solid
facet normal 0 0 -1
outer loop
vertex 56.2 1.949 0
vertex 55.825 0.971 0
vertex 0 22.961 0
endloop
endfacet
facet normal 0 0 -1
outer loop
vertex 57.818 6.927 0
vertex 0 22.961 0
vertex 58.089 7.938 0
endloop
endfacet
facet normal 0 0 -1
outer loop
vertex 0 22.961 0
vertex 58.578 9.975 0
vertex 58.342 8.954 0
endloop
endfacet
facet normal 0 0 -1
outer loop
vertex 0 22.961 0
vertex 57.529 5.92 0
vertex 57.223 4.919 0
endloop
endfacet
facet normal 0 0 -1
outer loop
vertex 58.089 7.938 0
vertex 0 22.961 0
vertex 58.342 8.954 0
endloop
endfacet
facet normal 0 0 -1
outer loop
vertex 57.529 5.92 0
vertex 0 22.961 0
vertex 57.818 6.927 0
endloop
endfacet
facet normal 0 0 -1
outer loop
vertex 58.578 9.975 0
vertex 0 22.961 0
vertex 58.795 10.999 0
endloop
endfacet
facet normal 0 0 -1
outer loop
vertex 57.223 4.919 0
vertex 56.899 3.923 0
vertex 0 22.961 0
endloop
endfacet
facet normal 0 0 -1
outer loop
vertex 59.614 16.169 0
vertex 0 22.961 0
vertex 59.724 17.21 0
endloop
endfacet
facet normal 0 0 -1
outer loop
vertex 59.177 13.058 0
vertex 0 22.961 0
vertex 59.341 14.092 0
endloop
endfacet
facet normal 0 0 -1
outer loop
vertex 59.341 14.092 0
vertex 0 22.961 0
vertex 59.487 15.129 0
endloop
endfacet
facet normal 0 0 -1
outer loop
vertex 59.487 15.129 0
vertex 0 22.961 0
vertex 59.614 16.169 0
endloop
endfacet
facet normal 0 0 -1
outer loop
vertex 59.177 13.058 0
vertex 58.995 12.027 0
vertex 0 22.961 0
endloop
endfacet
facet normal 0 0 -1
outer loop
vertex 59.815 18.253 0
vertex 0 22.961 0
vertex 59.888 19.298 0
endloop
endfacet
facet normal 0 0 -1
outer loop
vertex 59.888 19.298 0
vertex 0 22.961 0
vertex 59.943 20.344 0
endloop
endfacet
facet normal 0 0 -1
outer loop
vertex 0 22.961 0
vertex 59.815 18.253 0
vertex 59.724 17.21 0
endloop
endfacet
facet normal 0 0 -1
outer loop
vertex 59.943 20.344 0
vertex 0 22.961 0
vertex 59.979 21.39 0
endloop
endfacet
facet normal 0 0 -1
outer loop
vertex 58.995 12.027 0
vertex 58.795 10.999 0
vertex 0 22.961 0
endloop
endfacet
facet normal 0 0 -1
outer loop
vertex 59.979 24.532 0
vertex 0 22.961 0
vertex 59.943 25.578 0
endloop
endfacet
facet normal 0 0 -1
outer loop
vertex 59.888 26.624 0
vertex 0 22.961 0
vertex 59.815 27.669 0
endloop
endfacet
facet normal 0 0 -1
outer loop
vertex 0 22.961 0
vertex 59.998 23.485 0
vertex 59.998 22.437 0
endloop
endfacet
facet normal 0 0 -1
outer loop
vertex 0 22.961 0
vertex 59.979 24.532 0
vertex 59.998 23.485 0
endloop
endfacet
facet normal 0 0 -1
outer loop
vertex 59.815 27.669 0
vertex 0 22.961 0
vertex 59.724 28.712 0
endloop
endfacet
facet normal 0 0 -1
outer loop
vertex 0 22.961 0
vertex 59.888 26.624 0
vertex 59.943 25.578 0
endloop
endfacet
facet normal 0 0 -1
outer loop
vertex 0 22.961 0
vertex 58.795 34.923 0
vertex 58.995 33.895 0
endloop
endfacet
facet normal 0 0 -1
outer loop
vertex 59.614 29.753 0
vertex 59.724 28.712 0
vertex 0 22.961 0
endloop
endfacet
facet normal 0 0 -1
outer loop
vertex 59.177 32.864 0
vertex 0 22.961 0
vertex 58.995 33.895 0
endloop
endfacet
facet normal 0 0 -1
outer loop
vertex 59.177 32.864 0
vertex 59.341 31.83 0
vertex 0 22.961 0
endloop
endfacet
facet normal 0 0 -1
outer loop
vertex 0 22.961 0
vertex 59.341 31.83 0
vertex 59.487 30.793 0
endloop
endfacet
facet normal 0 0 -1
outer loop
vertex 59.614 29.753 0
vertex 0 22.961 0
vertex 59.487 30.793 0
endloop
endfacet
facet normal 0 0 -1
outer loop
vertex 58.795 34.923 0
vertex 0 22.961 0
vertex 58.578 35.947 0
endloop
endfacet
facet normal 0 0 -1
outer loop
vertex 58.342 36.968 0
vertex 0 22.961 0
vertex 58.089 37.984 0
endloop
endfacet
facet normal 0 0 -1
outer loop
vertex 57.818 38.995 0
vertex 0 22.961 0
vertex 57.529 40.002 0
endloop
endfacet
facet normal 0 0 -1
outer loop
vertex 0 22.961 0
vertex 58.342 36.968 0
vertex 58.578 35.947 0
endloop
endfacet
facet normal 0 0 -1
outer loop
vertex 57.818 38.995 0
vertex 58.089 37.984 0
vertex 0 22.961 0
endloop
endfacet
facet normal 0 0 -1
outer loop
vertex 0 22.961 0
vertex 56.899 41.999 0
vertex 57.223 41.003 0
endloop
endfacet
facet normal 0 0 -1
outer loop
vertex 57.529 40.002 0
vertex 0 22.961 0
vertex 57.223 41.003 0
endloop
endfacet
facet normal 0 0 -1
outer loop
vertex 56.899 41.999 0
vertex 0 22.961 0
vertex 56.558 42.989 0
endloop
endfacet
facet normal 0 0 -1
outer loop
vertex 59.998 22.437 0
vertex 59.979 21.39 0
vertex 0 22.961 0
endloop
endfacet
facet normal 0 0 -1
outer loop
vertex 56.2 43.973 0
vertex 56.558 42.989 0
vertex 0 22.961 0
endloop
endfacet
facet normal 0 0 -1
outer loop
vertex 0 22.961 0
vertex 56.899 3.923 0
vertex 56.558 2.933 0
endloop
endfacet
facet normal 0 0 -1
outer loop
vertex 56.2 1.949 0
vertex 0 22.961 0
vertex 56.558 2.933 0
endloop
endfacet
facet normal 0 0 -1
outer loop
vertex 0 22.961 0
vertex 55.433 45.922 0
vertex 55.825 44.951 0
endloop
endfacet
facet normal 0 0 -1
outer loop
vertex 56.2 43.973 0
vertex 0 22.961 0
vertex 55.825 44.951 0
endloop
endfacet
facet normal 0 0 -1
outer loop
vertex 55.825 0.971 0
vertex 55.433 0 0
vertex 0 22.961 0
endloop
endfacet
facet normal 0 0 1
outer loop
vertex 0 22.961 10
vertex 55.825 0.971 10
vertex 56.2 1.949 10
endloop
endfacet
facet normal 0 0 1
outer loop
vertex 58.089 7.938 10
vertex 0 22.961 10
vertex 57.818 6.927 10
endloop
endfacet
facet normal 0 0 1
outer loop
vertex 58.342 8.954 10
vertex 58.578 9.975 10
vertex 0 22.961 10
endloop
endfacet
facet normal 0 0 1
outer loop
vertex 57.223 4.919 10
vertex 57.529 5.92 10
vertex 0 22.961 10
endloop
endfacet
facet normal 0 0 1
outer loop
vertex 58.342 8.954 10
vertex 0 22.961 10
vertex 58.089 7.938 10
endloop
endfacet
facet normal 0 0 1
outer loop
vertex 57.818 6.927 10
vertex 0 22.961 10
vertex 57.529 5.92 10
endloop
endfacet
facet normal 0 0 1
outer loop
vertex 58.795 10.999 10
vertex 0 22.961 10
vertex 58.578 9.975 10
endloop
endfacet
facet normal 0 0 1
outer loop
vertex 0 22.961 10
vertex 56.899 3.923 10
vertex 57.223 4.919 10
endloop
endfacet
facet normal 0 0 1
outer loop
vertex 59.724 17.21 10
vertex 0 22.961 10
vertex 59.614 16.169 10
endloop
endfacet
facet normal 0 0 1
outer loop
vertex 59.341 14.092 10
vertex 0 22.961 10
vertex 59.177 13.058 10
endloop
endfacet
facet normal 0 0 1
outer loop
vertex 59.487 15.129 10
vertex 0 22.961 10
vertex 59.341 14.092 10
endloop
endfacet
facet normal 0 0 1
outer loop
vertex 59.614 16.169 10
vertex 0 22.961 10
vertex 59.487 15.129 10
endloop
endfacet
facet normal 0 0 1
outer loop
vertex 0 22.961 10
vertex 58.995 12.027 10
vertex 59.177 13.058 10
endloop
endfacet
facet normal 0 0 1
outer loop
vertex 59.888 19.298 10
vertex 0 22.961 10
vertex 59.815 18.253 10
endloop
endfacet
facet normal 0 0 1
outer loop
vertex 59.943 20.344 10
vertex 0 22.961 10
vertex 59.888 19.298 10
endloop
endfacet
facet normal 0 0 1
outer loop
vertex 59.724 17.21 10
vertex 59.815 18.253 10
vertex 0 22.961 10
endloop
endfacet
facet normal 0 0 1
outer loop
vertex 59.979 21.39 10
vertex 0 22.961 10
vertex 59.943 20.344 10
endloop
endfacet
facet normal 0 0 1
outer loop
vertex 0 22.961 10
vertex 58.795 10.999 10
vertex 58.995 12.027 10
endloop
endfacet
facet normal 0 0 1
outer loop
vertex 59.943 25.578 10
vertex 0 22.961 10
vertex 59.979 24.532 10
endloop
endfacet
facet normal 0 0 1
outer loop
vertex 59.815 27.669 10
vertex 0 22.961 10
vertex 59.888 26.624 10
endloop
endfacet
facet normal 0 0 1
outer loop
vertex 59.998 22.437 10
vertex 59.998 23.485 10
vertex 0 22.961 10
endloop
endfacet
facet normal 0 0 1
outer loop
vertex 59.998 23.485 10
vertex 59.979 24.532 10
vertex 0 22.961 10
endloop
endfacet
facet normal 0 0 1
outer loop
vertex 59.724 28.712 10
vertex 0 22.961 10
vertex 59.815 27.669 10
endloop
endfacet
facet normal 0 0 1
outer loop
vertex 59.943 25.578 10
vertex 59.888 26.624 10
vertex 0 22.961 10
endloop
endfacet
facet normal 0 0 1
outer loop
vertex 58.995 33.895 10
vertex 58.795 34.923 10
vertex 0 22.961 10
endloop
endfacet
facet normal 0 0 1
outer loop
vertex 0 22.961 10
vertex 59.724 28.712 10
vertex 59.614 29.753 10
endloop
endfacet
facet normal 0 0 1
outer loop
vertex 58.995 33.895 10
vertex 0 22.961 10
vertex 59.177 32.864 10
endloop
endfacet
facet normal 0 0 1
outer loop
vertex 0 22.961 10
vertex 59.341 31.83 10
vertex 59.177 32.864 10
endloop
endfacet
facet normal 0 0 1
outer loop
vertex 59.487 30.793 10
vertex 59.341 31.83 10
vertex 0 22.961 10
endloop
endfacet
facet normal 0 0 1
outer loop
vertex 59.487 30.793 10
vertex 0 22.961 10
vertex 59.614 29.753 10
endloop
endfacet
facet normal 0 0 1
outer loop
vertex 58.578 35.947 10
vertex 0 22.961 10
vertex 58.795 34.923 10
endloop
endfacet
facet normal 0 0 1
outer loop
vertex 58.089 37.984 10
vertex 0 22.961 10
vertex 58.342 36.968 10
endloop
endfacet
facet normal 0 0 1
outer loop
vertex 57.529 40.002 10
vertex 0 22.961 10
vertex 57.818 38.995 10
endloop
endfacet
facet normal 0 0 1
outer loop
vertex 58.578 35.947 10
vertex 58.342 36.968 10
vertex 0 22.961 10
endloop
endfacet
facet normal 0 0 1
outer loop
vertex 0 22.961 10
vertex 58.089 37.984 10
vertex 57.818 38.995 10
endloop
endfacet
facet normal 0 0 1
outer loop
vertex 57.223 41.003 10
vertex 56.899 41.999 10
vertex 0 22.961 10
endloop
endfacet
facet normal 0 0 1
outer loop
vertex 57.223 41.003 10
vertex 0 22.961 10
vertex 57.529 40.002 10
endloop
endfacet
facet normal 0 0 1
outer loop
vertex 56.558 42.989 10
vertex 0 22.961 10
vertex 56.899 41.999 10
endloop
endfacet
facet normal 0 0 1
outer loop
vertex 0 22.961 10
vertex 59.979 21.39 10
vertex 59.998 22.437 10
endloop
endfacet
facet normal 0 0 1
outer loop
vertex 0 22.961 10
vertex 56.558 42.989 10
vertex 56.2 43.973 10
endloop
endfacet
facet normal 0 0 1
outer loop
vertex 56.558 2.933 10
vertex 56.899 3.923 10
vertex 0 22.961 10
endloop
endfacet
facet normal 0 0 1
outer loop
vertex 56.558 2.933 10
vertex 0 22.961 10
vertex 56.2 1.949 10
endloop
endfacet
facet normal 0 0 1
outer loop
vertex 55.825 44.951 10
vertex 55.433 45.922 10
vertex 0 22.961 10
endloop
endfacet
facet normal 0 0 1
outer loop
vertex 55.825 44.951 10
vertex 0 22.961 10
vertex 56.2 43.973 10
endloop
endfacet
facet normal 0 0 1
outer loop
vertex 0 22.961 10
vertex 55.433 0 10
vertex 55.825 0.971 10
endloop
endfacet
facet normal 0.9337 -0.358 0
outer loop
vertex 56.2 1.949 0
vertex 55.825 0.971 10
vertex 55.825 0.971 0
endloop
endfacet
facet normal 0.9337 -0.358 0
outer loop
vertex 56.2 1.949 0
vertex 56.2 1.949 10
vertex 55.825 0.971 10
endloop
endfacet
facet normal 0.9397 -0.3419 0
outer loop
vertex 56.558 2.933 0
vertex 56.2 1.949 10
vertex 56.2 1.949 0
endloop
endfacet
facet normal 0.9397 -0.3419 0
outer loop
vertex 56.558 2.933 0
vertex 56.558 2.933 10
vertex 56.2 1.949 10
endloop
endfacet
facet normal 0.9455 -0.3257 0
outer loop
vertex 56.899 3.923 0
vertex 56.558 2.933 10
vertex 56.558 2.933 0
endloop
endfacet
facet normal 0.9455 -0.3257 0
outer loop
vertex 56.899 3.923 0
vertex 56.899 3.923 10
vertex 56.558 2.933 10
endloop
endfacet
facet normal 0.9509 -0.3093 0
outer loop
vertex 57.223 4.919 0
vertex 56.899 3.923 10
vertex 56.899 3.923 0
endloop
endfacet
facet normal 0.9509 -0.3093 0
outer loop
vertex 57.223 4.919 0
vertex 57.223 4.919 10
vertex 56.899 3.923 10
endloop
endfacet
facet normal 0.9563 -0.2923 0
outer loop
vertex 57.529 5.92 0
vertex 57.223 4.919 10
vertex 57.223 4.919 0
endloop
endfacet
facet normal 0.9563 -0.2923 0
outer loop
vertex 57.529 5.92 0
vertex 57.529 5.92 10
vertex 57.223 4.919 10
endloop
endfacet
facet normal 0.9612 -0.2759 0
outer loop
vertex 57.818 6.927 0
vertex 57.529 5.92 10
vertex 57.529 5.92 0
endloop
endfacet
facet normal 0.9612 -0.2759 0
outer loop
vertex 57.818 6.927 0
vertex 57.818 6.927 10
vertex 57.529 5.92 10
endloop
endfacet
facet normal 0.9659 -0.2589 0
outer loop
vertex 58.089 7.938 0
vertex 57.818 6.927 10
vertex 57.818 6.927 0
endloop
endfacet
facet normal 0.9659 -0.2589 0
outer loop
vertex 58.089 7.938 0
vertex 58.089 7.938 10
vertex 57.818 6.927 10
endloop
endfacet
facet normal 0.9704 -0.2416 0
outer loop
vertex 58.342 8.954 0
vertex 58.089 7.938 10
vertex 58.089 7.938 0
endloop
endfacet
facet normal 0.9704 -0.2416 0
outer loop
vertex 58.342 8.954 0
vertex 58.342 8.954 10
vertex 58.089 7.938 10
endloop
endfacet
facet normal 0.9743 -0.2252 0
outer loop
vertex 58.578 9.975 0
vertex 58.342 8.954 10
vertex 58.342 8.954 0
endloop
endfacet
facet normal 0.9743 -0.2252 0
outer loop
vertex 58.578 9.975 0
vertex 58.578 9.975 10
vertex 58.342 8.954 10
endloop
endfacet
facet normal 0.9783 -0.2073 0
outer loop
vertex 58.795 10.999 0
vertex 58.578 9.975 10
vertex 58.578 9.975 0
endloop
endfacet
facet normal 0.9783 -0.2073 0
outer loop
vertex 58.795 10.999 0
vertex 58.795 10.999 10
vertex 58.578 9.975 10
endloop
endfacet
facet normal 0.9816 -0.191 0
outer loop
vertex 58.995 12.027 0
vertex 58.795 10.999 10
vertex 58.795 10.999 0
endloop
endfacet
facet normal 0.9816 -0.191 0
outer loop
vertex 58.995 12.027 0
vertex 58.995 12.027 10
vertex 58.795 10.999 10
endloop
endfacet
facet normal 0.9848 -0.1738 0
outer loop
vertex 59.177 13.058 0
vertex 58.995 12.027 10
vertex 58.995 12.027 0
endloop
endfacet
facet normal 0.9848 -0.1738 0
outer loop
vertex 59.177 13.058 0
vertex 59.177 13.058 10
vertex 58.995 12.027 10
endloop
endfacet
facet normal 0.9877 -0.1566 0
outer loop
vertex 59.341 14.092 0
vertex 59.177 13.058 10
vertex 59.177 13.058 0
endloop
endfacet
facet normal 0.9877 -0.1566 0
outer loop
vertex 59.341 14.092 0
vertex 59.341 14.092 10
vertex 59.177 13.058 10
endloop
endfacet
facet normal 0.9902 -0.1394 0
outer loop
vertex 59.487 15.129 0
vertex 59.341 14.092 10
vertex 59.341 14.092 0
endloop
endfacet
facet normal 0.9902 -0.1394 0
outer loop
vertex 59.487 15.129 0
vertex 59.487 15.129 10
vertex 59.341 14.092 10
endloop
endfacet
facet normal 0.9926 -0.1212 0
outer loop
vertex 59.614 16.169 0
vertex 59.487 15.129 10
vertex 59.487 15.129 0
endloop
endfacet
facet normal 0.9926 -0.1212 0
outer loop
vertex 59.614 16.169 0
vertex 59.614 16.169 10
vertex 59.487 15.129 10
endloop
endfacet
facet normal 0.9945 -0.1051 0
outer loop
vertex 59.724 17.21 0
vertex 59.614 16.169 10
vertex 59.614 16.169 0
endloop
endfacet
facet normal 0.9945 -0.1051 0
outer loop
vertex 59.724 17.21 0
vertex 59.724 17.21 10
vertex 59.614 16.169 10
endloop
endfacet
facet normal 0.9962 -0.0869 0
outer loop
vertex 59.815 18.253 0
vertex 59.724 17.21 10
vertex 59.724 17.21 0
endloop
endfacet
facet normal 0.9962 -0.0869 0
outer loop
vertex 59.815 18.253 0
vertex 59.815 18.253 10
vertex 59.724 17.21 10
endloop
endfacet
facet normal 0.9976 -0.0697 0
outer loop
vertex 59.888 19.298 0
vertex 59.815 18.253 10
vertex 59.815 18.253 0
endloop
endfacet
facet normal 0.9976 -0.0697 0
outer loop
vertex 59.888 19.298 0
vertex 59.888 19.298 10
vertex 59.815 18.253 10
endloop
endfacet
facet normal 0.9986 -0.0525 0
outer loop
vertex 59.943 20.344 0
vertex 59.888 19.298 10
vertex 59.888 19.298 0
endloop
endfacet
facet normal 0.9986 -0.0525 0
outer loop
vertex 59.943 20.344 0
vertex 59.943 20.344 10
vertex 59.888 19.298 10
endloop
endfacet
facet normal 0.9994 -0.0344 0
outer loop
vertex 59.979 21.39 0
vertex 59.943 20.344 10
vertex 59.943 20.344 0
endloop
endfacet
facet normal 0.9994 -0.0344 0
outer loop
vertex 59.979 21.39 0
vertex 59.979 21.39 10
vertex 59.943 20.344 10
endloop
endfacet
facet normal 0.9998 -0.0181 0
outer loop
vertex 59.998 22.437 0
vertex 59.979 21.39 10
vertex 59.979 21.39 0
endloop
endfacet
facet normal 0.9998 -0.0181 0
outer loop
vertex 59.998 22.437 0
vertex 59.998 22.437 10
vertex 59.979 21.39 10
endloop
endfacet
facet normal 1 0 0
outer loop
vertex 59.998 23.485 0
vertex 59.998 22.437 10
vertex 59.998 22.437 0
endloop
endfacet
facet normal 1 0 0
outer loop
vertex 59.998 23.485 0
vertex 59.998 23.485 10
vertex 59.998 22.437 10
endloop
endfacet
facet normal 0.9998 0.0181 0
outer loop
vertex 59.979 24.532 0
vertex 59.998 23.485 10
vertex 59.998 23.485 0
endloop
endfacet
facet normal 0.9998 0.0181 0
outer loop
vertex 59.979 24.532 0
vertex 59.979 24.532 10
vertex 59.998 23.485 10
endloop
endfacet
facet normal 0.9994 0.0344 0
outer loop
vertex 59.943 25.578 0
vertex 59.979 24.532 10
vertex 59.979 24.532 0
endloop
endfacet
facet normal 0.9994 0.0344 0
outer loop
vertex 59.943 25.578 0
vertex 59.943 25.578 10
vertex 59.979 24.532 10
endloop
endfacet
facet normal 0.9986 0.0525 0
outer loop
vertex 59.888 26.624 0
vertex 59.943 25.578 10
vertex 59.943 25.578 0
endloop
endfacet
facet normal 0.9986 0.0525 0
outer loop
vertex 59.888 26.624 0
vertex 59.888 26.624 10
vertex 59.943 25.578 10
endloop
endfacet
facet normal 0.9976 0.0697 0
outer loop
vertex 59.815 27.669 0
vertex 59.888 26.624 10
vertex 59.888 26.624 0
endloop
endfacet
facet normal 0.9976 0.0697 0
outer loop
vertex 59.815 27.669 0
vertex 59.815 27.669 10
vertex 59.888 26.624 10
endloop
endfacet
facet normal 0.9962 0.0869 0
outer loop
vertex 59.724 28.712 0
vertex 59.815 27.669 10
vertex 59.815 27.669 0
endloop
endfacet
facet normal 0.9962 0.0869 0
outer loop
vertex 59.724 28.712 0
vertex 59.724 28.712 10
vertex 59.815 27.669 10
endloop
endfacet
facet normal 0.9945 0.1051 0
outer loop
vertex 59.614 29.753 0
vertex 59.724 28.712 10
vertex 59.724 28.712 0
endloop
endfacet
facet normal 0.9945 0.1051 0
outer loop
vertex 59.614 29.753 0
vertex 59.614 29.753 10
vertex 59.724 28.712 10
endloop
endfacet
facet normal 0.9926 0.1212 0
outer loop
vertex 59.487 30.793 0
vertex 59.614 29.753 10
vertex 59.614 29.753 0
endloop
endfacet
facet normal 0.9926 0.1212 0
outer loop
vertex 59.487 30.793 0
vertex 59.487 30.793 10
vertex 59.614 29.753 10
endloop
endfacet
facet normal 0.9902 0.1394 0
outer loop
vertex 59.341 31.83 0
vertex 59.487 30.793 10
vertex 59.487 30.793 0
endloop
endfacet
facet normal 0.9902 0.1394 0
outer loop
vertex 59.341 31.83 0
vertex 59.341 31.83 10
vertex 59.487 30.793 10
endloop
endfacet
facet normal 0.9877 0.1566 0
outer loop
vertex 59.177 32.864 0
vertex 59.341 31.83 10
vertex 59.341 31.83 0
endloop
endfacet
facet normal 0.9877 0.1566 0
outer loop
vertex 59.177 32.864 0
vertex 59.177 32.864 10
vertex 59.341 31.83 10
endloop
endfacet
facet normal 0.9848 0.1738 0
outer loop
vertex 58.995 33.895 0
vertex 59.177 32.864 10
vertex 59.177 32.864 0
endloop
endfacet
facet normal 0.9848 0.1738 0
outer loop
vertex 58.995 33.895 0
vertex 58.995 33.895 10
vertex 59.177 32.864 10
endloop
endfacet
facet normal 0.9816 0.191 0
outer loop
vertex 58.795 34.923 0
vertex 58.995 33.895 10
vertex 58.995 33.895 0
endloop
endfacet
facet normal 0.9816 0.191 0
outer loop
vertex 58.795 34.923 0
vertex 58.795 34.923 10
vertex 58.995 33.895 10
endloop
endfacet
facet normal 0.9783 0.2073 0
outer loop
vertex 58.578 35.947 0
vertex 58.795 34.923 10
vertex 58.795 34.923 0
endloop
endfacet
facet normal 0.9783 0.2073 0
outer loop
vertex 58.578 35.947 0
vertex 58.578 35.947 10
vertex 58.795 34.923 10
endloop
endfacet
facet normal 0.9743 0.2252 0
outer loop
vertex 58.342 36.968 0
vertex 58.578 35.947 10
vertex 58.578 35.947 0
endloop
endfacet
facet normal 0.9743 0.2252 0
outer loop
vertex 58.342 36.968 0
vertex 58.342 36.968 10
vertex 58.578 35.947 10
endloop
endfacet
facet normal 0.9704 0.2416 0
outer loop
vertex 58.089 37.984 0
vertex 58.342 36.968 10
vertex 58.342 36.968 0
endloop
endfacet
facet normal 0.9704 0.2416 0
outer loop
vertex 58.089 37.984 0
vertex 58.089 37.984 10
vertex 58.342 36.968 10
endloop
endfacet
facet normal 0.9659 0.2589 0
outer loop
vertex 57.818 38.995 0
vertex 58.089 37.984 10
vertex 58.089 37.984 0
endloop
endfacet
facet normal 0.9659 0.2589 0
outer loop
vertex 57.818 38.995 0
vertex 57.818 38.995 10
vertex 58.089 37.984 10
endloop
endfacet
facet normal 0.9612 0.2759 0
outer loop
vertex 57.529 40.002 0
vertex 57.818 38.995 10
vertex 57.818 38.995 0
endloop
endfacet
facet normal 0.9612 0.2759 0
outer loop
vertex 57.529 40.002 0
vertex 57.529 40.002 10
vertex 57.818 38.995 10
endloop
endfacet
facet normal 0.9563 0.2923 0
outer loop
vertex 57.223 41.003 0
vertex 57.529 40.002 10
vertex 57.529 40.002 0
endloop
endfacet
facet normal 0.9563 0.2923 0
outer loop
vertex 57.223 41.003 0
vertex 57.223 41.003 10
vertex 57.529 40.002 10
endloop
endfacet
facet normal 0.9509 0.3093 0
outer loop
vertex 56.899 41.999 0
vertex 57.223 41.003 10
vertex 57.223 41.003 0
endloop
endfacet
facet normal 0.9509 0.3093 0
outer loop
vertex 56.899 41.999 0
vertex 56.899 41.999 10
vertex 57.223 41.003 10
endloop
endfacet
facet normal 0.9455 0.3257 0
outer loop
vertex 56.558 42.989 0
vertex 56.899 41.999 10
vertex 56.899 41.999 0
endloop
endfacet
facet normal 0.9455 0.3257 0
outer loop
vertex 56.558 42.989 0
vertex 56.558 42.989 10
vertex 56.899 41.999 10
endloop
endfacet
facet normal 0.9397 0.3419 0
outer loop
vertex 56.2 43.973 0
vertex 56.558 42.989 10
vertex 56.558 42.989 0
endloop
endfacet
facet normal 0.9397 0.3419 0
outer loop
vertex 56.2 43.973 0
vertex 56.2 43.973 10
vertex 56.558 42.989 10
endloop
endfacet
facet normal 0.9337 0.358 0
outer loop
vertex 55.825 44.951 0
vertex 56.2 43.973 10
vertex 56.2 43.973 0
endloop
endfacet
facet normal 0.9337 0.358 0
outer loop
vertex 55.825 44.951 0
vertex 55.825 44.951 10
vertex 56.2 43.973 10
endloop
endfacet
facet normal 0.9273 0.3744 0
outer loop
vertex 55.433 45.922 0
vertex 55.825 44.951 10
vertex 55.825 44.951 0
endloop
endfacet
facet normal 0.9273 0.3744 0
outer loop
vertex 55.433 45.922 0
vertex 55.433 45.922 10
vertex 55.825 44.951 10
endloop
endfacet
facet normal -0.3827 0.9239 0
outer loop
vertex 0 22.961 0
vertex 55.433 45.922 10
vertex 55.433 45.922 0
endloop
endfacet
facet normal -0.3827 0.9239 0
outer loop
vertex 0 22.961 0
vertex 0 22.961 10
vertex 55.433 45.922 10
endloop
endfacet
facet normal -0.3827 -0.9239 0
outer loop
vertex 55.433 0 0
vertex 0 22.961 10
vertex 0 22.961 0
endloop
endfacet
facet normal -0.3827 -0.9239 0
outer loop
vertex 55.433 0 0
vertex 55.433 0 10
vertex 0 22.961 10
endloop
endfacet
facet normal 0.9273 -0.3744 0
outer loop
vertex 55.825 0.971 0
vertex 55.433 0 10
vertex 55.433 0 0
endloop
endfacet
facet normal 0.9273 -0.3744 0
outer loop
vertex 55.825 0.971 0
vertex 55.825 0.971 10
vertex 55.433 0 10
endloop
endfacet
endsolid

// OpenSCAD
$fn = 32;

// ----------------------------------------------------------------------
// Arc profile plate: sector, 47 points
// ----------------------------------------------------------------------

// --- parameters (mm) ---
sector_angle = 45;        // sector angle, degrees
sector_r = 60;            // outer radius
arc_step = 1;             // sampling step of the arc, degrees
plate_t = 10;             // plate thickness, Z

bbox_x = 2 * sector_r * sin(sector_angle / 2);  // chord of the sector
bbox_y = sector_r;  // depth of the sector (apex to arc)

profile = [[55.433, 0], [55.825, 0.971], [56.2, 1.949], [56.558, 2.933], [56.899, 3.923], [57.223, 4.919], [57.529, 5.92], [57.818, 6.927], [58.089, 7.938], [58.342, 8.954], [58.578, 9.975], [58.795, 10.999], [58.995, 12.027], [59.177, 13.058], [59.341, 14.092], [59.487, 15.129], [59.614, 16.169], [59.724, 17.21], [59.815, 18.253], [59.888, 19.298], [59.943, 20.344], [59.979, 21.39], [59.998, 22.437], [59.998, 23.485], [59.979, 24.532], [59.943, 25.578], [59.888, 26.624], [59.815, 27.669], [59.724, 28.712], [59.614, 29.753], [59.487, 30.793], [59.341, 31.83], [59.177, 32.864], [58.995, 33.895], [58.795, 34.923], [58.578, 35.947], [58.342, 36.968], [58.089, 37.984], [57.818, 38.995], [57.529, 40.002], [57.223, 41.003], [56.899, 41.999], [56.558, 42.989], [56.2, 43.973], [55.825, 44.951], [55.433, 45.922], [0, 22.961]];  // primary outline, 47 points, counter clockwise

// --- the one profile operation ---
linear_extrude(height = plate_t) polygon(points = profile);
